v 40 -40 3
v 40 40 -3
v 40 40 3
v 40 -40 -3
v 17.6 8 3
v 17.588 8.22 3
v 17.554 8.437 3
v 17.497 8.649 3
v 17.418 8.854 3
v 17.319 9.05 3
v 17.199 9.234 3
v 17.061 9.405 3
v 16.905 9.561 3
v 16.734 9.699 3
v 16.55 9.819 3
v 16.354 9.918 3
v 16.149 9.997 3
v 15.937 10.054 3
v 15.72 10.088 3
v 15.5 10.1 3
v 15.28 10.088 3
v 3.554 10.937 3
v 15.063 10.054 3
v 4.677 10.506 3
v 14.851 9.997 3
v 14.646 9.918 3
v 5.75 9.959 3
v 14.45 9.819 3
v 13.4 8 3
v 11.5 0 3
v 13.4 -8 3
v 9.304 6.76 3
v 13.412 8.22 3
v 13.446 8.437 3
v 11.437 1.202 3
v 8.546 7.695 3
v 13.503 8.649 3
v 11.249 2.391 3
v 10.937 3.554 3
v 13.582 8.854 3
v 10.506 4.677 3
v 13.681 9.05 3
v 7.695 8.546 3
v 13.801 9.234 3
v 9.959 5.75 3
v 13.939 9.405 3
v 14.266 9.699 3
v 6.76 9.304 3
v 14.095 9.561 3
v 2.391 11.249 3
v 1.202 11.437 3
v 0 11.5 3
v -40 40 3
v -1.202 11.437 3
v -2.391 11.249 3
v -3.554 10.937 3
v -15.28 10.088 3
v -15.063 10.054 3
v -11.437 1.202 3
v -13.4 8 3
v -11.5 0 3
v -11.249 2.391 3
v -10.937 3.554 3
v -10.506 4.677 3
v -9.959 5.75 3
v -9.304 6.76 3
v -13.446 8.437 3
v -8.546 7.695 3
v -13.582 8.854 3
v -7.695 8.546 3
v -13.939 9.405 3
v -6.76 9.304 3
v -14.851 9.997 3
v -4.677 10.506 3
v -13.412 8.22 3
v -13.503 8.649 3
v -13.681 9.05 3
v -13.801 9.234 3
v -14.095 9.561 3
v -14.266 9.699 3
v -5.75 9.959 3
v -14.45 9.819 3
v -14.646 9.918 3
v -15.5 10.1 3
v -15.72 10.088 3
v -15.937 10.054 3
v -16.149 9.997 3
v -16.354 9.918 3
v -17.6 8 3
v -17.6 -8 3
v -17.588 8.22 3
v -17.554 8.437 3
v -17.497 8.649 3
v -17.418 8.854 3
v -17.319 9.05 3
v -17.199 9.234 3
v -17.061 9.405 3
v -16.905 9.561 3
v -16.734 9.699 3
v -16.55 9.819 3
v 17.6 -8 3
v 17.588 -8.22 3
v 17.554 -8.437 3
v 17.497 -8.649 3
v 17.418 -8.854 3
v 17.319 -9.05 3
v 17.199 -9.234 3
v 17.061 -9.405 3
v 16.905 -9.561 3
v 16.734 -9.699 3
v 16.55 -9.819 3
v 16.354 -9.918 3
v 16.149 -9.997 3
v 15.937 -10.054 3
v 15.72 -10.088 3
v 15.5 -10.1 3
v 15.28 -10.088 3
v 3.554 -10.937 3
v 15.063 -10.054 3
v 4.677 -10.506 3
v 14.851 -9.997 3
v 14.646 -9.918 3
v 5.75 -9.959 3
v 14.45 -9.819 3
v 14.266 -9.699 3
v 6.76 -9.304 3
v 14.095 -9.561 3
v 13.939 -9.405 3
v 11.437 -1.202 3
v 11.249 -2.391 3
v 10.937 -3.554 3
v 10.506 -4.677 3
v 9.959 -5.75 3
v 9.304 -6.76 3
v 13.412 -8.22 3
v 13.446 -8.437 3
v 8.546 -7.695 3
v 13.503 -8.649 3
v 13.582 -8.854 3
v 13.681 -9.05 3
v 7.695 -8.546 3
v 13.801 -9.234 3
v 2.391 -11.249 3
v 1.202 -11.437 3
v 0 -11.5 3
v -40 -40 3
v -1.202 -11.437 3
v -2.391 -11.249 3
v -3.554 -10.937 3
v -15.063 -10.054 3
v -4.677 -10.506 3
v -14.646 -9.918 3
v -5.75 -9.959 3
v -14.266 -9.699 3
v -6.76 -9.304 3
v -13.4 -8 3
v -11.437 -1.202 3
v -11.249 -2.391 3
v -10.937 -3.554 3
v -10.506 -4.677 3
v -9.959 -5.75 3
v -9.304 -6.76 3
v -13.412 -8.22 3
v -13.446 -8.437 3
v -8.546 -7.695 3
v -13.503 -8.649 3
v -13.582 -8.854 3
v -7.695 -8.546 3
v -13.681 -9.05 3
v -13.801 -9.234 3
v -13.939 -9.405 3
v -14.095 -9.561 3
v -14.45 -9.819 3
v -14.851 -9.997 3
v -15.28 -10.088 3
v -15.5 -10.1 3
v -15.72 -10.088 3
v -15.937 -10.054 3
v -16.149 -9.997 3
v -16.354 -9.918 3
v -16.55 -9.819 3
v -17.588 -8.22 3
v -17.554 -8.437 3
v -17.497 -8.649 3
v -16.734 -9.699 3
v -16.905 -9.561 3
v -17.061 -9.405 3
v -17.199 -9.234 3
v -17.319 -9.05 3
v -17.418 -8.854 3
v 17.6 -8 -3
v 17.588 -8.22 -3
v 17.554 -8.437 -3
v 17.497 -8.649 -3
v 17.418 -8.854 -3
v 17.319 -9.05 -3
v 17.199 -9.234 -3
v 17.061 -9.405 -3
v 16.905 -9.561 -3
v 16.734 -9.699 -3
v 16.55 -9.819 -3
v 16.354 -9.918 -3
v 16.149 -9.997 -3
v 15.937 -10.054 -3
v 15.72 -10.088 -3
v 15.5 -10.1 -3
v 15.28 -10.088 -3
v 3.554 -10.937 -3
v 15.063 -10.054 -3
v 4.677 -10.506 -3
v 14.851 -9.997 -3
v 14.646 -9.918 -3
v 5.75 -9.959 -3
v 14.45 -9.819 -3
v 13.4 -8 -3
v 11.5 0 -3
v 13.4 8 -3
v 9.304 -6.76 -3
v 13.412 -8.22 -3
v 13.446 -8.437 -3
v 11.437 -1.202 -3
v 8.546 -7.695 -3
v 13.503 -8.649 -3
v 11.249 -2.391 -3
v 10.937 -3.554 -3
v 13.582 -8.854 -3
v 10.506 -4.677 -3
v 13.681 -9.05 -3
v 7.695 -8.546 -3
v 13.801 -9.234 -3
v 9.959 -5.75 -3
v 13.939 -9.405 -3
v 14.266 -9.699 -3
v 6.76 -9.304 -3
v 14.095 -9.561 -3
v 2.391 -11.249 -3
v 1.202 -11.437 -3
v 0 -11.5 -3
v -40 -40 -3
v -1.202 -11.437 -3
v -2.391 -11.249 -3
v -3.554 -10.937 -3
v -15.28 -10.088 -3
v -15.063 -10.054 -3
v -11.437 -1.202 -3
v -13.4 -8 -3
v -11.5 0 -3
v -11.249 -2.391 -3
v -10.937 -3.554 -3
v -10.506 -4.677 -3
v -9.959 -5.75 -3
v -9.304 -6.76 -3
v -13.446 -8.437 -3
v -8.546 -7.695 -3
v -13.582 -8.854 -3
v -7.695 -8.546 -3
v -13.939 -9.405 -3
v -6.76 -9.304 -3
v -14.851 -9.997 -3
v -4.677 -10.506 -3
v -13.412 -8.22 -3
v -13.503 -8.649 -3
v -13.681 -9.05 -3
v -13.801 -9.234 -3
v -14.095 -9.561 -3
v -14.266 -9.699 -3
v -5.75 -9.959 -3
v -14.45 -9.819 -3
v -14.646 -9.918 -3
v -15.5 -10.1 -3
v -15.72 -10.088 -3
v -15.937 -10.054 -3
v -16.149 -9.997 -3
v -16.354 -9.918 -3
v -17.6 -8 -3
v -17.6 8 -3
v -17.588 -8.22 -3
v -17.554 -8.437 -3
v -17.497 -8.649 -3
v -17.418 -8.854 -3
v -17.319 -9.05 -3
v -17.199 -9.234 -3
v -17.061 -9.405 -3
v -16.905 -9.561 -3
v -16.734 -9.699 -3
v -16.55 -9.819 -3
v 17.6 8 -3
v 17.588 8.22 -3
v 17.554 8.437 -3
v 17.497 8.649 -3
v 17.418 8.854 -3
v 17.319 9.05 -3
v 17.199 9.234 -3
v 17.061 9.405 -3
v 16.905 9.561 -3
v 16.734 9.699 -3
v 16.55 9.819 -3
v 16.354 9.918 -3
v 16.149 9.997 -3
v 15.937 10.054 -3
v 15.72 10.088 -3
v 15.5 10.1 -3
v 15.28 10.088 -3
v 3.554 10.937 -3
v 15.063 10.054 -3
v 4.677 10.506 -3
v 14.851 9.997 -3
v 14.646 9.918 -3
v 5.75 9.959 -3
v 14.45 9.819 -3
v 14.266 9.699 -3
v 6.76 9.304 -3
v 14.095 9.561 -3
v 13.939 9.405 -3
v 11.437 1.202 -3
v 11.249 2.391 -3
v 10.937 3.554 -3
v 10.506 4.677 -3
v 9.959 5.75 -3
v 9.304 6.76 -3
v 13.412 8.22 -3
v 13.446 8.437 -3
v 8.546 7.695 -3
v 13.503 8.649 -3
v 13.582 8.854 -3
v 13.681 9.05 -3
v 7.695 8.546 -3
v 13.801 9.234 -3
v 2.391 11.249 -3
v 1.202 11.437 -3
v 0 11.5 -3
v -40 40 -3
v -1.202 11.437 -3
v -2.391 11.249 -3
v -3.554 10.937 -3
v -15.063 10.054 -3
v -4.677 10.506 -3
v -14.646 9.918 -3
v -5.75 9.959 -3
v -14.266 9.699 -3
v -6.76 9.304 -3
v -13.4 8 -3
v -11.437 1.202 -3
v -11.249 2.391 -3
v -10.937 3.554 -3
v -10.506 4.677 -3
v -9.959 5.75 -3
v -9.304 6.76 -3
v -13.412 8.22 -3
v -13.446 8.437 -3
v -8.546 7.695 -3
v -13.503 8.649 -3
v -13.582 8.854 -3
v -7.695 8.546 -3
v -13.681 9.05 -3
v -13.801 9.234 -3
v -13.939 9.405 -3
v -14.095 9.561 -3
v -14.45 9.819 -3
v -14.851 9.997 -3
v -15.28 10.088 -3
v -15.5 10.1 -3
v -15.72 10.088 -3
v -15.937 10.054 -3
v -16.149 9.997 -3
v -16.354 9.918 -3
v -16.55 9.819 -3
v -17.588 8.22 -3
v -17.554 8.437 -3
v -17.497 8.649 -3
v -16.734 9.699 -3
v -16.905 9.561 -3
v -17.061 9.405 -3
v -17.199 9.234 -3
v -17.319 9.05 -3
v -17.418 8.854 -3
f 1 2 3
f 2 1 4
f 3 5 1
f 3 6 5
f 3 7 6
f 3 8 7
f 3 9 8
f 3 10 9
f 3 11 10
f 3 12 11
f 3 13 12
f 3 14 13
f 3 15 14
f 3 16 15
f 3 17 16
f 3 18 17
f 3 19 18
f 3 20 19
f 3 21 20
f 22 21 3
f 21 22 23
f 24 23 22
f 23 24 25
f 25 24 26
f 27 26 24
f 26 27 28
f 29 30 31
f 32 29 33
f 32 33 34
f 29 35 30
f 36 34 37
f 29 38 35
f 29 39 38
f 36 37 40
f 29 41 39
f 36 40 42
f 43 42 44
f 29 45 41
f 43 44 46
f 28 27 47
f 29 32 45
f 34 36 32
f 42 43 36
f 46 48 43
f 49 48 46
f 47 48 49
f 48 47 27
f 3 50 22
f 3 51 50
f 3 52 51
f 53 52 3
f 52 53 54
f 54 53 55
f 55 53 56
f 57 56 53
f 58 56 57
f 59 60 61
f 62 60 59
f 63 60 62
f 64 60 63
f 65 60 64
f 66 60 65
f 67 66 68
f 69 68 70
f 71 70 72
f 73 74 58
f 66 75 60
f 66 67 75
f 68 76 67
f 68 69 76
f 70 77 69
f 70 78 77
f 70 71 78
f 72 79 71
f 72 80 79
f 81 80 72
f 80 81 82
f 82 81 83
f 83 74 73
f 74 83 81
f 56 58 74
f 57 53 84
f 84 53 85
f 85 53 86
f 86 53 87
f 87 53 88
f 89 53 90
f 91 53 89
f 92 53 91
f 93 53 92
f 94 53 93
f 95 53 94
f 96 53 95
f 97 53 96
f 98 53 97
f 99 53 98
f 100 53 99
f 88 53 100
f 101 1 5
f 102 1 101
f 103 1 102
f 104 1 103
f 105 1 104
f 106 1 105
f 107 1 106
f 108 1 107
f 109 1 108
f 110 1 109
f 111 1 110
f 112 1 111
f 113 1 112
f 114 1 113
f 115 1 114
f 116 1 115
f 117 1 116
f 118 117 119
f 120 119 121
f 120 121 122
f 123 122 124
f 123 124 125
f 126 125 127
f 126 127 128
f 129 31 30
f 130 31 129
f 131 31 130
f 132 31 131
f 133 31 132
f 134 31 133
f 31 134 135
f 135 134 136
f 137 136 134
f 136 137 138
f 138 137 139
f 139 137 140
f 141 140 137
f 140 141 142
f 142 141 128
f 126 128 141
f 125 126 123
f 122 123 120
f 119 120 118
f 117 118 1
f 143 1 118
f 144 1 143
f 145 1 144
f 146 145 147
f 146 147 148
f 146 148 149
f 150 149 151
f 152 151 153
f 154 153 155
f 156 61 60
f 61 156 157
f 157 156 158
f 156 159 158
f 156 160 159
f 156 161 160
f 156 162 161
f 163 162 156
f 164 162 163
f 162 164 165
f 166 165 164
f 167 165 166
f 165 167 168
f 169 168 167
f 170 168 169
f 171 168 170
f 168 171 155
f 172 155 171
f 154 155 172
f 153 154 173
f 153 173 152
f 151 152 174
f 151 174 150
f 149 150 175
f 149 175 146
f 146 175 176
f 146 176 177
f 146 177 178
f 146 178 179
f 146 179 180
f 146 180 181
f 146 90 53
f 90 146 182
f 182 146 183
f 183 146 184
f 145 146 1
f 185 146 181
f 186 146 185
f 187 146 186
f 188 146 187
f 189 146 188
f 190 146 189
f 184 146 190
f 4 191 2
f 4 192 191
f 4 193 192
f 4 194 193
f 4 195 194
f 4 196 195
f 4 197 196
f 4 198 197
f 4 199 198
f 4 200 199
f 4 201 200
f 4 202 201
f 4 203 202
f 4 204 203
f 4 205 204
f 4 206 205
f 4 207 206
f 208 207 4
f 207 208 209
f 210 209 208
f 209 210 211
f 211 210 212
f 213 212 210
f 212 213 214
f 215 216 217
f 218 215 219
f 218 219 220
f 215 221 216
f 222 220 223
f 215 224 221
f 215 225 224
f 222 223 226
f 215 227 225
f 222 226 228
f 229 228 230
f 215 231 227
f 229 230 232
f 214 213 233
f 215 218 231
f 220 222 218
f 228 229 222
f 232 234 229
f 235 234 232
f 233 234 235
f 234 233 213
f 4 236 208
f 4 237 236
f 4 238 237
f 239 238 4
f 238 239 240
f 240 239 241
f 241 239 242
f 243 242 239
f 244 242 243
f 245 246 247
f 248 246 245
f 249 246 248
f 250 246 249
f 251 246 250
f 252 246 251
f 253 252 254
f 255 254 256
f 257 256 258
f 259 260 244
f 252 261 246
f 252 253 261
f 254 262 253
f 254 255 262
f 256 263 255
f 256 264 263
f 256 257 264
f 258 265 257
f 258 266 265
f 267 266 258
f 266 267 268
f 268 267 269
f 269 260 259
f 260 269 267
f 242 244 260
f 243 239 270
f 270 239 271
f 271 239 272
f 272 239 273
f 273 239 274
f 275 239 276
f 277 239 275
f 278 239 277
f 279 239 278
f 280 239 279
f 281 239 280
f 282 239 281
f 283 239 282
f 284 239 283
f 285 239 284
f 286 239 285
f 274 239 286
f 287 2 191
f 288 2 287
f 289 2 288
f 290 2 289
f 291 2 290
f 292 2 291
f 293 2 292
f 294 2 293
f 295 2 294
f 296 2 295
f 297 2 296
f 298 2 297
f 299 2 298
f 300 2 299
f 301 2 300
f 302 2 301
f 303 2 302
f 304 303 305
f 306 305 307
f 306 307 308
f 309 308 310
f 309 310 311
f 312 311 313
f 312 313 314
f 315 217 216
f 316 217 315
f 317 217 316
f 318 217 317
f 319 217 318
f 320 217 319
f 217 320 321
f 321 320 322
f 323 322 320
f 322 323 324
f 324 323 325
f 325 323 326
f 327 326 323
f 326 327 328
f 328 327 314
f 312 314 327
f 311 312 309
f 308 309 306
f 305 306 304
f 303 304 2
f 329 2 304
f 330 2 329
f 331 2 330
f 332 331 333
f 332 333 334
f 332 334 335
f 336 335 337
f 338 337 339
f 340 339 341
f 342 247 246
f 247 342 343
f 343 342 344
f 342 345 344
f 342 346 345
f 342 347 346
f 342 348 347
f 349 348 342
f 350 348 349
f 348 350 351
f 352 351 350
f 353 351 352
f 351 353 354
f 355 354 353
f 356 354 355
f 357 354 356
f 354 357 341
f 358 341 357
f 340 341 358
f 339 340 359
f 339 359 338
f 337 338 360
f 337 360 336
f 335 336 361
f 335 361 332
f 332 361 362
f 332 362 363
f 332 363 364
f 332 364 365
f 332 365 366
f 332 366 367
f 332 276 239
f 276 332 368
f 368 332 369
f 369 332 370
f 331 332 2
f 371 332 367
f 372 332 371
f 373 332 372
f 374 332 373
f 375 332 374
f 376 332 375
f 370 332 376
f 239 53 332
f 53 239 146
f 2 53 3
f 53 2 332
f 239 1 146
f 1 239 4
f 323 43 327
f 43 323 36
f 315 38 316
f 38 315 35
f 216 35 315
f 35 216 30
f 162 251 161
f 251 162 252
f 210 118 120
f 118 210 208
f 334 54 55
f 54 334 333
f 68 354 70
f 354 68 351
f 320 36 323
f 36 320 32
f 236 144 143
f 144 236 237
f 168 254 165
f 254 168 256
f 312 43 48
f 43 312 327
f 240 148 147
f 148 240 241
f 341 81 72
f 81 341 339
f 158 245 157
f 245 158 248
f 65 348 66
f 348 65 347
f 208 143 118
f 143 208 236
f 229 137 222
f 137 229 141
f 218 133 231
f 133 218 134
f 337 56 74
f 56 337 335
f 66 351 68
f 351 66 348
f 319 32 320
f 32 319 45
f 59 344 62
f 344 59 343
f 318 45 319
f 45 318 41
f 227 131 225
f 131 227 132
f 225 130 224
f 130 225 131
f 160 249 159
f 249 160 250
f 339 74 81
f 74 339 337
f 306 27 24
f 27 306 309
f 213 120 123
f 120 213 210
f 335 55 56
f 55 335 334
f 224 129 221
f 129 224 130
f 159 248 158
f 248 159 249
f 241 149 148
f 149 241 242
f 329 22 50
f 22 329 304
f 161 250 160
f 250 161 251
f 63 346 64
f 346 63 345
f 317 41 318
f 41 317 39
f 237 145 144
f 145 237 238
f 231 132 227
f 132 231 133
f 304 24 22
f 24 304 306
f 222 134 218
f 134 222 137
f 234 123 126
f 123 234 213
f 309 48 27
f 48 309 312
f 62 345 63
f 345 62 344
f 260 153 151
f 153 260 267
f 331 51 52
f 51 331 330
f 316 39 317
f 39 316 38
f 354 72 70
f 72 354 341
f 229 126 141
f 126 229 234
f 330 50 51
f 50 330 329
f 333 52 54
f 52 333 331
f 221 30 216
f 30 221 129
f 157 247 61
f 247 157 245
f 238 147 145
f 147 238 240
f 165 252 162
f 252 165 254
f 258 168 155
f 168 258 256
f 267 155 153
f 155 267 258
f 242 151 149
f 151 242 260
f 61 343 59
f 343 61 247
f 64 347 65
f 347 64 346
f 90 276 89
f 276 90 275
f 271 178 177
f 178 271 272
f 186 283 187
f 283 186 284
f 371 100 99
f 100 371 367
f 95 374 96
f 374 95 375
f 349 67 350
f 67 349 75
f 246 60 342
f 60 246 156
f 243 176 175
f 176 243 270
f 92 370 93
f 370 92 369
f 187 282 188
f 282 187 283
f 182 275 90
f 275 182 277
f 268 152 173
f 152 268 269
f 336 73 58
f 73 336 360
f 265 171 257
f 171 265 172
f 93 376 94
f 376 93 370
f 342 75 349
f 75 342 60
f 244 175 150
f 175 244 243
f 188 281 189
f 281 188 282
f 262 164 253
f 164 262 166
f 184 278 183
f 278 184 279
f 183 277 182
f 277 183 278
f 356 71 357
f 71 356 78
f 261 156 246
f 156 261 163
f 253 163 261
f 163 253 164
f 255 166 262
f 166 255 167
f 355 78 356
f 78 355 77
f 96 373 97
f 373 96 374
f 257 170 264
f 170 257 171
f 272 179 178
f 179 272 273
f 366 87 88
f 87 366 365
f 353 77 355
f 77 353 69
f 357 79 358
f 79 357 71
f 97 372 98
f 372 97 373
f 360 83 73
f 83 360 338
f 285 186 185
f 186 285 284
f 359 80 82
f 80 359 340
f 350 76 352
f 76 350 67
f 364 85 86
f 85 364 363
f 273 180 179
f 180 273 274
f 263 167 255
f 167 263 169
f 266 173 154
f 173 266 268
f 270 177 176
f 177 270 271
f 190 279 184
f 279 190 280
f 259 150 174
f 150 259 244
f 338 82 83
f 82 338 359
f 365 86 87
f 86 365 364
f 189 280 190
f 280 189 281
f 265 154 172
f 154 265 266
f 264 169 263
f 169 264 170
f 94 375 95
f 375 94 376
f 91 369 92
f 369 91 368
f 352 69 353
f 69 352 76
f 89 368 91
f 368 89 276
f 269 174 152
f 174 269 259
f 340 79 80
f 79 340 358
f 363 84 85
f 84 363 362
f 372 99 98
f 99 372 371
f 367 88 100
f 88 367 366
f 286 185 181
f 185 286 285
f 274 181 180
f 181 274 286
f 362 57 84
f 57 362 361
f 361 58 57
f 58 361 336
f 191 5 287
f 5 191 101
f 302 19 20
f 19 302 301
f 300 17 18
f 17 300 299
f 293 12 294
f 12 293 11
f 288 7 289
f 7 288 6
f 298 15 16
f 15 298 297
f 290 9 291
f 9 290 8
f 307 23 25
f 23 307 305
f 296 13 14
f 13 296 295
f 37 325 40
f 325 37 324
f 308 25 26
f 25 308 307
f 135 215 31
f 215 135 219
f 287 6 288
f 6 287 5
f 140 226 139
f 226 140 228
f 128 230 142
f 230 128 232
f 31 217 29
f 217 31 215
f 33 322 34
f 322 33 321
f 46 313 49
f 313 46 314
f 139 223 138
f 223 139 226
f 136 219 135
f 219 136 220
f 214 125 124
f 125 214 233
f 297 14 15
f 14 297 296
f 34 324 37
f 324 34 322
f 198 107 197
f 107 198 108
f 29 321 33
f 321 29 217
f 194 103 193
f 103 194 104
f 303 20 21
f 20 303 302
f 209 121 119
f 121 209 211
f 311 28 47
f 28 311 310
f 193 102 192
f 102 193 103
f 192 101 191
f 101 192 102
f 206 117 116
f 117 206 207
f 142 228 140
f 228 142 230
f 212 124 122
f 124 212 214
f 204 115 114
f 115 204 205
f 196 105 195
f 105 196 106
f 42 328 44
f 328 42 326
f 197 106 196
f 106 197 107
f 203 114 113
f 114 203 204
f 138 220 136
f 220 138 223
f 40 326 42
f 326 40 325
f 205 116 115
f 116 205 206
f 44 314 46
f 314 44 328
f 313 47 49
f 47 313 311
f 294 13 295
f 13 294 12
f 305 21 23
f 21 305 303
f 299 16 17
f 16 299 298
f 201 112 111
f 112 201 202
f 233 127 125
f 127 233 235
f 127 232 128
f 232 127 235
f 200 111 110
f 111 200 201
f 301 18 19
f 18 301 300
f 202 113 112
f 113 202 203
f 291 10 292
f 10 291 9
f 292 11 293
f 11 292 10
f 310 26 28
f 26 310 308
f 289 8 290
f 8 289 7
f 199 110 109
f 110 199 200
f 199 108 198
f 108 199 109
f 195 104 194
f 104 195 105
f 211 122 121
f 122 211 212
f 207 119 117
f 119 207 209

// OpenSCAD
// NEMA 17 adjustable motor plate, 80 mm square.
$fn = 60;
eps = 0.02;
plate = 80;
plate_t = 6;
hole_pitch = 31;
center_d = 23;
slot_l = 16;
slot_d = 4.2;
module slot(x) {
    hull() {
        translate([x, -slot_l / 2, -plate_t / 2 - eps]) cylinder(d = slot_d, h = plate_t + 2 * eps);
        translate([x, slot_l / 2, -plate_t / 2 - eps]) cylinder(d = slot_d, h = plate_t + 2 * eps);
    }
}
difference() {
    cube([plate, plate, plate_t], center = true);
    translate([0, 0, -plate_t / 2 - eps]) cylinder(d = center_d, h = plate_t + 2 * eps);
    slot(-hole_pitch / 2);
    slot(hole_pitch / 2);
}
